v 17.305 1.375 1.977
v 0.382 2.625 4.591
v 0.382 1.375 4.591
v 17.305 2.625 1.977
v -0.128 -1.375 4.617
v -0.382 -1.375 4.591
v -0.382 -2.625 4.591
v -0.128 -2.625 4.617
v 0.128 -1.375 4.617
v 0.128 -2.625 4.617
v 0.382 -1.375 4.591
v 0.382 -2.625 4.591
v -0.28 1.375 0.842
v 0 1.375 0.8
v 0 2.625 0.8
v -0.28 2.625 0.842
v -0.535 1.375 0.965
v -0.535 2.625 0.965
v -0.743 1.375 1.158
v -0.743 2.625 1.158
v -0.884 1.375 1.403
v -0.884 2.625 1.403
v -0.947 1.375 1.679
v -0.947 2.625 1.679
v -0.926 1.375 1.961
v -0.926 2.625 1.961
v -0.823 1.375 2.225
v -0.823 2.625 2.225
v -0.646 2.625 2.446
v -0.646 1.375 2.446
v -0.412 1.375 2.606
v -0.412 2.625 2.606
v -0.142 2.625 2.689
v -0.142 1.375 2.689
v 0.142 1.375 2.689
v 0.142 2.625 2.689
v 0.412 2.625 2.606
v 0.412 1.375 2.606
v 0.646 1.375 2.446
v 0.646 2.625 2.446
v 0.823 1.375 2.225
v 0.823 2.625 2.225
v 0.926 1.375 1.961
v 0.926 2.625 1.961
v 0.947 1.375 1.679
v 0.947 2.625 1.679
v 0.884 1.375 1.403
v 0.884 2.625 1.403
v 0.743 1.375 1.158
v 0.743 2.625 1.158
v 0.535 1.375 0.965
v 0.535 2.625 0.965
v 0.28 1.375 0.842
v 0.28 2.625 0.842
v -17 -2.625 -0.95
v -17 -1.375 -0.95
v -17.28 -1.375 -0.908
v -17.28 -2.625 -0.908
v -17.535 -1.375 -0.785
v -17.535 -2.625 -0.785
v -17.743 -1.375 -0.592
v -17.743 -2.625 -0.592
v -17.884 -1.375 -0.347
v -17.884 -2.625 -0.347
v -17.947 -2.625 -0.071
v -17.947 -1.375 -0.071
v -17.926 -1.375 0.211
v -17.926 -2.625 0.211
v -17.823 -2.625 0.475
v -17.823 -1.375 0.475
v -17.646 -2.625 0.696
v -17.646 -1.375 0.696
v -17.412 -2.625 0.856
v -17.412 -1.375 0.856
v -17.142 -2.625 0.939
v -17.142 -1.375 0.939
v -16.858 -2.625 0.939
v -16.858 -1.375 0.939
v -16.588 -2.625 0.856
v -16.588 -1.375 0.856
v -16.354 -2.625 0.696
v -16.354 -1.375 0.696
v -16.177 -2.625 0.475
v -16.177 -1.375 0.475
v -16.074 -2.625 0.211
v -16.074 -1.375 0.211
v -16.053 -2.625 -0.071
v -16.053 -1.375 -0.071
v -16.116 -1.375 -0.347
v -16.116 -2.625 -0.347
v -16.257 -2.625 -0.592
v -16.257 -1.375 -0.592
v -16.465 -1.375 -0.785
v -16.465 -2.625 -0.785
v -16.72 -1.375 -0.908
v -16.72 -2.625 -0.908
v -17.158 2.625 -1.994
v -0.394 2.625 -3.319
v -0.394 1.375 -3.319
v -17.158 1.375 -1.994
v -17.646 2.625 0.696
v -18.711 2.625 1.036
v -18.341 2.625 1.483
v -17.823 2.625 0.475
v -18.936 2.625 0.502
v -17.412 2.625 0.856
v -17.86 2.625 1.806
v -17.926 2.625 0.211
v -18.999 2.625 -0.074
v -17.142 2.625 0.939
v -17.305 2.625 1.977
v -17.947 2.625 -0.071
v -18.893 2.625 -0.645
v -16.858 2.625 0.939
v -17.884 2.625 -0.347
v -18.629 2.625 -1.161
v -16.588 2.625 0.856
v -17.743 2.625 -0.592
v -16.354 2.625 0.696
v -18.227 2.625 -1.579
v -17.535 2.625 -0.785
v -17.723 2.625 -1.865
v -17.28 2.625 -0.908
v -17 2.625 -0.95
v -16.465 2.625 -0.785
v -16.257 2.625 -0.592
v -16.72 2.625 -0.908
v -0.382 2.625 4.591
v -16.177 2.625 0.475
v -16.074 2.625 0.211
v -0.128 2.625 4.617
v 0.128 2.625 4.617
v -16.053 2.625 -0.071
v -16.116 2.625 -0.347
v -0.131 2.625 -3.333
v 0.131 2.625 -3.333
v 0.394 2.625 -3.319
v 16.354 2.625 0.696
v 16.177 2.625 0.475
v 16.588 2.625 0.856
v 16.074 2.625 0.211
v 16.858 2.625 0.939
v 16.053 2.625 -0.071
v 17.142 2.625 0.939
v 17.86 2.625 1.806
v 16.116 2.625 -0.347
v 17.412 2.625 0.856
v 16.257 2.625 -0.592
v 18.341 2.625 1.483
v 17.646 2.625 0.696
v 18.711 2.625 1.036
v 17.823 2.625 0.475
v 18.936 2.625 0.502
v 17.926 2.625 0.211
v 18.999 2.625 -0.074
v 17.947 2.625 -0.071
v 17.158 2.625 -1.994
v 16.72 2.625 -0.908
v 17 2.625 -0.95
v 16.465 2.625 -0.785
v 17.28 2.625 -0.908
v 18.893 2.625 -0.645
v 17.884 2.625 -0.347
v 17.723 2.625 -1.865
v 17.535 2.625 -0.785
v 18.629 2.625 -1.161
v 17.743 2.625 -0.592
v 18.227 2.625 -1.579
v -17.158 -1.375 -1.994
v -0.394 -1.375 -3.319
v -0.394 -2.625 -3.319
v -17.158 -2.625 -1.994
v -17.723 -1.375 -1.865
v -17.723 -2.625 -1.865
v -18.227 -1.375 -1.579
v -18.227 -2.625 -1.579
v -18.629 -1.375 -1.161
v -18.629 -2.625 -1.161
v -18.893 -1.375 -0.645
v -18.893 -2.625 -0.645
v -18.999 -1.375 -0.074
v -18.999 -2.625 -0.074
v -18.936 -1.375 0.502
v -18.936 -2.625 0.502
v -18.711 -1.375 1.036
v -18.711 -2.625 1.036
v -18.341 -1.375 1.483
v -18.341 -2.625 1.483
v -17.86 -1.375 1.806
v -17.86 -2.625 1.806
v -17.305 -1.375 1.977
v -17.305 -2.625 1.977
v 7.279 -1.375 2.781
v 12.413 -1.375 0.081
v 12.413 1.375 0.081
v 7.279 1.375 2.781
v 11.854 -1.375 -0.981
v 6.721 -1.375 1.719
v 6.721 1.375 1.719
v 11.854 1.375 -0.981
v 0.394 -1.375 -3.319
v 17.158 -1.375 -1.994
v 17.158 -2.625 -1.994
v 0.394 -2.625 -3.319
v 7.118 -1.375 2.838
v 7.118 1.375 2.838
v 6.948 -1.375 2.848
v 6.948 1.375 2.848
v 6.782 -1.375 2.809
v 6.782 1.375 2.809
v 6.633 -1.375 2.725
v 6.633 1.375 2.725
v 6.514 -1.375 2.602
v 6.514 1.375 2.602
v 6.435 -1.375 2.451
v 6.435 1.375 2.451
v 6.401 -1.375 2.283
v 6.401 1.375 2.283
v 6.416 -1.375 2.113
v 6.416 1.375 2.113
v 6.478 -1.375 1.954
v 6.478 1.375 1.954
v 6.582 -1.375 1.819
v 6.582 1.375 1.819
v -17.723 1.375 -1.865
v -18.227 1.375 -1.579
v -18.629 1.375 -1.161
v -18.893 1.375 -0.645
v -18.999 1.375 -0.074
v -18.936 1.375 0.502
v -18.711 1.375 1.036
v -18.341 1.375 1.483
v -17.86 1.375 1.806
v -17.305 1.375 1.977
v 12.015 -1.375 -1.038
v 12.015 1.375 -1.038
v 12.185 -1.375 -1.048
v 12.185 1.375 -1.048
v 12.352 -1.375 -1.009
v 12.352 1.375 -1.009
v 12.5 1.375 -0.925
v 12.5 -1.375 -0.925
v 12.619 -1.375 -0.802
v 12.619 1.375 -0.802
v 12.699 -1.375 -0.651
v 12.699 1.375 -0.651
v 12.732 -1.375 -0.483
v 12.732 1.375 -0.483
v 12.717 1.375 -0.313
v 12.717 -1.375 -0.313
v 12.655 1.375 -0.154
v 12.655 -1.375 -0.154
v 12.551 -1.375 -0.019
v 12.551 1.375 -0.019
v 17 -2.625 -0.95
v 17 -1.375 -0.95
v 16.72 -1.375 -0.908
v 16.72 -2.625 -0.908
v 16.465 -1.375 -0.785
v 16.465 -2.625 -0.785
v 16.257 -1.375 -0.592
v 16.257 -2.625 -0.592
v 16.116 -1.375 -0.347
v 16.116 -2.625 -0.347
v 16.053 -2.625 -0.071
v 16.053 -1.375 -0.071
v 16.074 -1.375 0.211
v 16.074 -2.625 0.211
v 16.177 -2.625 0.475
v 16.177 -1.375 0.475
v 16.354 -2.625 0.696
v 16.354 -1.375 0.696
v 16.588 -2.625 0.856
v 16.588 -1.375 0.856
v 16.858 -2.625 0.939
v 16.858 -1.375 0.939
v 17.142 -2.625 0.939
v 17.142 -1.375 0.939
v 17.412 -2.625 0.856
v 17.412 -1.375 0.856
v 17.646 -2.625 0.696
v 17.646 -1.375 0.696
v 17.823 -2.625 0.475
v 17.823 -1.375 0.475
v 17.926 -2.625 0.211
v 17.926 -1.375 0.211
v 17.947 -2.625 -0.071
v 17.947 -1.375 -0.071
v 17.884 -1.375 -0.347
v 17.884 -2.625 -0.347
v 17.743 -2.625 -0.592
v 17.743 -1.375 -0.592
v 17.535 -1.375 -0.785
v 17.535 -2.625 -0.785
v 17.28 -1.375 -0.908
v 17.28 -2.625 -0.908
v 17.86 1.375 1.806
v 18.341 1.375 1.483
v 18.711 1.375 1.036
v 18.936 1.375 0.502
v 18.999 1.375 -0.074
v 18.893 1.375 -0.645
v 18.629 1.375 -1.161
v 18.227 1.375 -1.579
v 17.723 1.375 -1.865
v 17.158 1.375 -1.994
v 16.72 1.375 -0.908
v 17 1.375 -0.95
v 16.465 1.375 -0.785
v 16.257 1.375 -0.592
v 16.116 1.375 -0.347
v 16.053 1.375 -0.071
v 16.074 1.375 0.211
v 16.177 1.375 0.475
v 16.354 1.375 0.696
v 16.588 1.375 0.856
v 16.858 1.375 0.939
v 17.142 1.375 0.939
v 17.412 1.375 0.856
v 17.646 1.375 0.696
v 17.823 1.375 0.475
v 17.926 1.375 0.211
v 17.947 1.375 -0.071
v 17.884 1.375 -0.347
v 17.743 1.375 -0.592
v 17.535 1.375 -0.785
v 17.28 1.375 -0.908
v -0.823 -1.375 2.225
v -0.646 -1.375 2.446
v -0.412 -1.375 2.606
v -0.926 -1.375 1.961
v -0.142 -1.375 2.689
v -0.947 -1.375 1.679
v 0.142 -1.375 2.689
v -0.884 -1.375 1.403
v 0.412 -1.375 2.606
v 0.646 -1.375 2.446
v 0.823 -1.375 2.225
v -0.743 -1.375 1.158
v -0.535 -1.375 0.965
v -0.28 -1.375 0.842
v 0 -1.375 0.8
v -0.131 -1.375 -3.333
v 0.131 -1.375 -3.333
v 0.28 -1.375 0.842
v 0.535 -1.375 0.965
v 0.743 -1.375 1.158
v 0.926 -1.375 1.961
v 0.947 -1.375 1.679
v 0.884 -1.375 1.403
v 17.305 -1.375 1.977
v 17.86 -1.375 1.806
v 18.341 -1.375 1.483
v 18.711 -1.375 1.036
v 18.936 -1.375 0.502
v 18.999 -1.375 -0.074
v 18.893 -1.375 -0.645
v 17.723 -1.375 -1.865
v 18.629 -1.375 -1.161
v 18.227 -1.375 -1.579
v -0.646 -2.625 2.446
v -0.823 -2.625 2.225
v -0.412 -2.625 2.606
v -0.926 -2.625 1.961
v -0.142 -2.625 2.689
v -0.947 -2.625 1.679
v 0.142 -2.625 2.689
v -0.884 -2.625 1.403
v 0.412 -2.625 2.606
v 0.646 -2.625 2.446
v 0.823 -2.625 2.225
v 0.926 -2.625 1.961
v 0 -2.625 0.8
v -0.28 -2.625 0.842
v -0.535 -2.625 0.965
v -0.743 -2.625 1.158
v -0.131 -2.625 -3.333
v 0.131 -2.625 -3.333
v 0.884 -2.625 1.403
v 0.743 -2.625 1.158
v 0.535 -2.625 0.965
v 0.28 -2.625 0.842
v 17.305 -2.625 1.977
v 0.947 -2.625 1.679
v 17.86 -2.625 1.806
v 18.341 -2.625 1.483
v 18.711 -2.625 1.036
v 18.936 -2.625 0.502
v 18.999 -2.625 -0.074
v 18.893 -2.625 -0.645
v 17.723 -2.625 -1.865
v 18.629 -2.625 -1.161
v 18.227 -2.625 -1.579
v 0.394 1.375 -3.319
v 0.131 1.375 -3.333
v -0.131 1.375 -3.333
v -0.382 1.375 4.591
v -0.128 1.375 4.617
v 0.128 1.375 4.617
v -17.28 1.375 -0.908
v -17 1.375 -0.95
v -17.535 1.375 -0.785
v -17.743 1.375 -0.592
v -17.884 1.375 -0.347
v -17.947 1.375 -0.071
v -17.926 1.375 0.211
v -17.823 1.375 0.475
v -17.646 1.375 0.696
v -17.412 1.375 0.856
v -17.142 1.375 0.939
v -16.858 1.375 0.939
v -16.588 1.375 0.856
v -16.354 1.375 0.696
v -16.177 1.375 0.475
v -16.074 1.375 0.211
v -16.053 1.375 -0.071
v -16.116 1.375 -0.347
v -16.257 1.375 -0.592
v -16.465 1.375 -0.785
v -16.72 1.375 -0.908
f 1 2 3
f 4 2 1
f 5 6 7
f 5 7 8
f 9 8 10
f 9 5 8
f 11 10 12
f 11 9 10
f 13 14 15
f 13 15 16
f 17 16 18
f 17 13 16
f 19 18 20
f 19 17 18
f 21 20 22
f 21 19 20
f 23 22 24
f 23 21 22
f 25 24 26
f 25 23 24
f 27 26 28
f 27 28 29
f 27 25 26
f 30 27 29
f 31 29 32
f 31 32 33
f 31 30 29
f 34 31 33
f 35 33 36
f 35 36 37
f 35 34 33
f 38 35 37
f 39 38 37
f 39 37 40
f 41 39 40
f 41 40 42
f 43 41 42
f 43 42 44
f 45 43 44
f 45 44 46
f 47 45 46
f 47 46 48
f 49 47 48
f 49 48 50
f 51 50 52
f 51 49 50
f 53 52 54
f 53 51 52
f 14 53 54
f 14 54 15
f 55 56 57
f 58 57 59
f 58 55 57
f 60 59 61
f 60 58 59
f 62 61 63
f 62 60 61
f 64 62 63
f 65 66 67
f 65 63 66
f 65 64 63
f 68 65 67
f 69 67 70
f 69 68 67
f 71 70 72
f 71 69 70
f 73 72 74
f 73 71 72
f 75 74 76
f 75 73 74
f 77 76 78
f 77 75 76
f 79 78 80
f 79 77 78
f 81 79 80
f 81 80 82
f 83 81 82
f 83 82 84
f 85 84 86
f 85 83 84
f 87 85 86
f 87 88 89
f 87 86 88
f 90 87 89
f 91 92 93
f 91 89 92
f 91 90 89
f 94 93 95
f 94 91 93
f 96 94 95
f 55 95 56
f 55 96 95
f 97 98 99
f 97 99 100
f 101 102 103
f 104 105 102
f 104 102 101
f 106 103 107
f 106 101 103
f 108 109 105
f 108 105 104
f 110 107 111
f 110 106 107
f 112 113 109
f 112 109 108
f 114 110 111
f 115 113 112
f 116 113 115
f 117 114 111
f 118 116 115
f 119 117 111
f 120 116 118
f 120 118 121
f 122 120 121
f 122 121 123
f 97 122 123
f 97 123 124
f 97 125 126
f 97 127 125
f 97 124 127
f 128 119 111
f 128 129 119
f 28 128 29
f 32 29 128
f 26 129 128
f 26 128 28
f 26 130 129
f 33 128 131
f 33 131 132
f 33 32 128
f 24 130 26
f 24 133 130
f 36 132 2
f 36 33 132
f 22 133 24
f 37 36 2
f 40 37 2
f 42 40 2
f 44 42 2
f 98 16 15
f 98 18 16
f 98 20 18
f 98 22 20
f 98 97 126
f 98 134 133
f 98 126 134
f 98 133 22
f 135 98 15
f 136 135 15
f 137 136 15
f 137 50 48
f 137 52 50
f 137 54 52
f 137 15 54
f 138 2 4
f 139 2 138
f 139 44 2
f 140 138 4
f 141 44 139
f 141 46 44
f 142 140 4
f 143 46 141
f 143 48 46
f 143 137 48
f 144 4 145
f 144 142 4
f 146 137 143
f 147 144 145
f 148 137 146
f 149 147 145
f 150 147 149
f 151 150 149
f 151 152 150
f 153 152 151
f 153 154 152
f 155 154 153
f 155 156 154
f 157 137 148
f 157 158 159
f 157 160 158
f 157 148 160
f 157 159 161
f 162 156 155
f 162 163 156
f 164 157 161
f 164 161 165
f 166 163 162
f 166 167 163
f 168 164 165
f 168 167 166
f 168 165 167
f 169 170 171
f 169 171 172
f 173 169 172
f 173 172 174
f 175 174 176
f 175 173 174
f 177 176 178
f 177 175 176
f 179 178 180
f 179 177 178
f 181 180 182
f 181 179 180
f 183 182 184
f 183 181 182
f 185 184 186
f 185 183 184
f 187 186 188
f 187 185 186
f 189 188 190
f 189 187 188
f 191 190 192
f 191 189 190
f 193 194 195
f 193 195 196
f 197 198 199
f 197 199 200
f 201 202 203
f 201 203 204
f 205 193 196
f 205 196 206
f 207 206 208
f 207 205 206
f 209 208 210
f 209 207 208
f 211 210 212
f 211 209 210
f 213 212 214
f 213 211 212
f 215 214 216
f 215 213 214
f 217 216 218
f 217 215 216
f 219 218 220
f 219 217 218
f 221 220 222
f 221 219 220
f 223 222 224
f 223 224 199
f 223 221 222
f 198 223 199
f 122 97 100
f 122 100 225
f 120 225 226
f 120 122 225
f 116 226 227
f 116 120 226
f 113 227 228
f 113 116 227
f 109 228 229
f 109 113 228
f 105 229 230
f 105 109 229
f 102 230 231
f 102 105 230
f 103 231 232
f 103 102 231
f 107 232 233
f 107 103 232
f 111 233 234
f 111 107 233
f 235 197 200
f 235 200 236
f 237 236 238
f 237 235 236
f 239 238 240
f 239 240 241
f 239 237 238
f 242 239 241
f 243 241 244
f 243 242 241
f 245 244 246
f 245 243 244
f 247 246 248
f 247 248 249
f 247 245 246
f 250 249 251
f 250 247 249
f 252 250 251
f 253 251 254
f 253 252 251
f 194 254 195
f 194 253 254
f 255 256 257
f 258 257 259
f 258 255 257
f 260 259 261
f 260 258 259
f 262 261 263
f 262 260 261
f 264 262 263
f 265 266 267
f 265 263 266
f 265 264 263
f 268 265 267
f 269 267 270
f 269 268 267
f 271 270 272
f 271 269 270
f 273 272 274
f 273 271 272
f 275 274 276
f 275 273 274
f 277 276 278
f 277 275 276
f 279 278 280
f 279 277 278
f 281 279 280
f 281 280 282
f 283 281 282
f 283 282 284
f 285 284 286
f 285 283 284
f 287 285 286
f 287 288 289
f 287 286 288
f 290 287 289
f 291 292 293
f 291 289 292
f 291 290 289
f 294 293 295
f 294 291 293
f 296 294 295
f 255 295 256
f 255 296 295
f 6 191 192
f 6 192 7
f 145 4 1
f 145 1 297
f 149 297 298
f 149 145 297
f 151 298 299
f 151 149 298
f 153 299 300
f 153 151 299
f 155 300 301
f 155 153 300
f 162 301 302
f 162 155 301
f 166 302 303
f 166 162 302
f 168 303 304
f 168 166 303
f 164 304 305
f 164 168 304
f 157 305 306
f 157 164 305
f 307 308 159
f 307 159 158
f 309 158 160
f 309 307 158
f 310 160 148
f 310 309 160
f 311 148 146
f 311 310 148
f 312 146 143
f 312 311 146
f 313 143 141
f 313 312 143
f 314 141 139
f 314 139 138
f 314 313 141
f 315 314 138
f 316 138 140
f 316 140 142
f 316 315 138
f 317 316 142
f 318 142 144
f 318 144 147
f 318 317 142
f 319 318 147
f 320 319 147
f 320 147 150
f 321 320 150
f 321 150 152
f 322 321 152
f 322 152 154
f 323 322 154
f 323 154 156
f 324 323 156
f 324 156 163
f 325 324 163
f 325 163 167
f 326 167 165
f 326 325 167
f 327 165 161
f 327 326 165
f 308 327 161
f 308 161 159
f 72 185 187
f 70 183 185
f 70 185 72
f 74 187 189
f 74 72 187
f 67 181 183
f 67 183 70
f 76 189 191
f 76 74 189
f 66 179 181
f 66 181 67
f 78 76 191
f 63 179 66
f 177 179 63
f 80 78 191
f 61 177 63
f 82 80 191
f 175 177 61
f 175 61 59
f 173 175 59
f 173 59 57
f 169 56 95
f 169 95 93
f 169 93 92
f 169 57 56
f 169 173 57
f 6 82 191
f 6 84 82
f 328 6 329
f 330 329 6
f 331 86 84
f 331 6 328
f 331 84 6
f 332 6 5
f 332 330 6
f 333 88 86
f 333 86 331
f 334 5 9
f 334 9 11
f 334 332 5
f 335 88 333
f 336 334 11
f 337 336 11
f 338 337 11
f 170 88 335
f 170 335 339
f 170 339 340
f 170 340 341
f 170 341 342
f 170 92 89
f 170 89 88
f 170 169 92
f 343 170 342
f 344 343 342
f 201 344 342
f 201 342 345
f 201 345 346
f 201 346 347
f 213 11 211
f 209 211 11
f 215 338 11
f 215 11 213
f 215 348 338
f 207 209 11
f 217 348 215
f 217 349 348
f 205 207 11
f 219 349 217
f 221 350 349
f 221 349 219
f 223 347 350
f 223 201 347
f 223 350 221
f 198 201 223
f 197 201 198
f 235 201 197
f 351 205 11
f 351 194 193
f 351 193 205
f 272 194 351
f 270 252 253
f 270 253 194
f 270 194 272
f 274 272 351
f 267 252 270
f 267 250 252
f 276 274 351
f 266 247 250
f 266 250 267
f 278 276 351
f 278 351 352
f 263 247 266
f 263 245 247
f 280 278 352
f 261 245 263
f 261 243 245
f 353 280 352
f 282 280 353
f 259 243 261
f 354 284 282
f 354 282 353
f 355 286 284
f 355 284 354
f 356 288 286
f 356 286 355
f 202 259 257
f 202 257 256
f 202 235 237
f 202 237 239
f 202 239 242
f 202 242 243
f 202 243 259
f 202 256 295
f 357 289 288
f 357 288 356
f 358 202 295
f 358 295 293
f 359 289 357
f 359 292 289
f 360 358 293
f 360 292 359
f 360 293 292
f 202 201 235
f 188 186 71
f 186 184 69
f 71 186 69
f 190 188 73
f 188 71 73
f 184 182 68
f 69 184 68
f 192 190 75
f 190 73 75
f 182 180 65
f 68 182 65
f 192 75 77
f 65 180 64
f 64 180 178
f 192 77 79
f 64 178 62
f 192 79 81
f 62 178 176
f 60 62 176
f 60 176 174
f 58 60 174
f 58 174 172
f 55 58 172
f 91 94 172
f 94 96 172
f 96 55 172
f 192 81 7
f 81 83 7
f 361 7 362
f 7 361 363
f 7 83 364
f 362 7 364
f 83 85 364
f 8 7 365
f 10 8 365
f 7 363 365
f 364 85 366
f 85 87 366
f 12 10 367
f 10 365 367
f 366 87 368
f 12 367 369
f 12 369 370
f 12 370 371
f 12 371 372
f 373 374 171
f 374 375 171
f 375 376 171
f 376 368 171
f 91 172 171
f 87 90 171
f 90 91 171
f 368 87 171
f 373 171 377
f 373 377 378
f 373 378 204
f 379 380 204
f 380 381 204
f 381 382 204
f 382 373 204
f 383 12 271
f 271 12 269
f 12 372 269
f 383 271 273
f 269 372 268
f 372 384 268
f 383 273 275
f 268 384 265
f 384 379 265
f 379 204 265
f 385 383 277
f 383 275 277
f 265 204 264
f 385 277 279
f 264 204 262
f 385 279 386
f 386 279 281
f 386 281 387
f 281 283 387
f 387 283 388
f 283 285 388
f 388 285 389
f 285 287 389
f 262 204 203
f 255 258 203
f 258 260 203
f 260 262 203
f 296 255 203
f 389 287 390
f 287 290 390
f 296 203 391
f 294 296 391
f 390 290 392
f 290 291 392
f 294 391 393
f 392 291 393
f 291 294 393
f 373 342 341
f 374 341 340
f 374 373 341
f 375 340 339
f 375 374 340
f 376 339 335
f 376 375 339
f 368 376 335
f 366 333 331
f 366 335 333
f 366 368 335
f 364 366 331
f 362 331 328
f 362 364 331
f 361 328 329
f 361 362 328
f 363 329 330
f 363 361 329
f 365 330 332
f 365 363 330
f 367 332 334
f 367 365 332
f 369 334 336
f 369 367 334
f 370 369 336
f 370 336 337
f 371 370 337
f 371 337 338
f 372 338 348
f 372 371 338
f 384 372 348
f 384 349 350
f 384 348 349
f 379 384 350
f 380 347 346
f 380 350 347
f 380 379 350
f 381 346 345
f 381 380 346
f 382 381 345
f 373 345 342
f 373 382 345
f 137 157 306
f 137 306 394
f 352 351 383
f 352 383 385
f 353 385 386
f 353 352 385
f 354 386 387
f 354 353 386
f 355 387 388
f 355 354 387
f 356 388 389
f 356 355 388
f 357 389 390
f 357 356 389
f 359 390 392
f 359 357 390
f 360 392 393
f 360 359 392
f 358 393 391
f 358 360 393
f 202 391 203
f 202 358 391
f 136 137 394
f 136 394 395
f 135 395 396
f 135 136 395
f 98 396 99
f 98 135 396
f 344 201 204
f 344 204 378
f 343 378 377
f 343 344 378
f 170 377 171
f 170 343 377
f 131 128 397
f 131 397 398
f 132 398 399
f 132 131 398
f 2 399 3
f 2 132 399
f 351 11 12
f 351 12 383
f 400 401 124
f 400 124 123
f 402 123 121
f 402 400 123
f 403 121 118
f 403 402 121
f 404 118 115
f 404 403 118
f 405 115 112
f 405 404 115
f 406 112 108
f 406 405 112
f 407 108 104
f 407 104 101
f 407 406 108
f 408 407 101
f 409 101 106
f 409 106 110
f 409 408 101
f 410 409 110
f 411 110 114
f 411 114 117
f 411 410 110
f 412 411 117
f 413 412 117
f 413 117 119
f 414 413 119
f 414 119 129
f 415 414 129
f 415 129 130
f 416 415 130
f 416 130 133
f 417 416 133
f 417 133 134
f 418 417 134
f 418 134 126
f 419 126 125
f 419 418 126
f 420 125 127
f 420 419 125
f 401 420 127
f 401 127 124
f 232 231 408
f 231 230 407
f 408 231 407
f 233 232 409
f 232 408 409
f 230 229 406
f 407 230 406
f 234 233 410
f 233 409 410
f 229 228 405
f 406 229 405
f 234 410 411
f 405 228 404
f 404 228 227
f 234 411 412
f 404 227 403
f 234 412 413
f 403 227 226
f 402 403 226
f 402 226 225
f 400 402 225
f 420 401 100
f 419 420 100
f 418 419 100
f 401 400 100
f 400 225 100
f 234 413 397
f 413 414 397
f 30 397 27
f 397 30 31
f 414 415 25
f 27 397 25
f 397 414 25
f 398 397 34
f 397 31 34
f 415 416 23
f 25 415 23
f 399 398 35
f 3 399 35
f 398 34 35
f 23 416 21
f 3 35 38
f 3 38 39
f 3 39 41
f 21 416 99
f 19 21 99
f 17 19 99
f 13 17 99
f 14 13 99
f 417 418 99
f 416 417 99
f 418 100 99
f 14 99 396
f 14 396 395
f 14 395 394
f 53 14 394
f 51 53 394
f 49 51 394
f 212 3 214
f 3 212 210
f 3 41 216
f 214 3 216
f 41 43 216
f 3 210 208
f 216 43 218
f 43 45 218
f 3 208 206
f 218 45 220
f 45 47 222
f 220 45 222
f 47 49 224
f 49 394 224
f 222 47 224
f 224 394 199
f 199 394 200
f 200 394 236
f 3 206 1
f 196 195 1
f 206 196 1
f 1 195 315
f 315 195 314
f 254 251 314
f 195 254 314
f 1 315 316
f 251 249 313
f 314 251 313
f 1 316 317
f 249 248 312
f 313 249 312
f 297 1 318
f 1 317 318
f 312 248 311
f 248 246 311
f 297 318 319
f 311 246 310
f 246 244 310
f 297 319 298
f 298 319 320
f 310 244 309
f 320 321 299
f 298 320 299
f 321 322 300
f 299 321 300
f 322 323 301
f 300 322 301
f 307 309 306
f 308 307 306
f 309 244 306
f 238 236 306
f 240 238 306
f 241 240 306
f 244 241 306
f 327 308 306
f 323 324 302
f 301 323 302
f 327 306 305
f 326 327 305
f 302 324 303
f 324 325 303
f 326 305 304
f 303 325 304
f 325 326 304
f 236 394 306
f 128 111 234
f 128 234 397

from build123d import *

# Parameters (mm, degrees)
SKETCH1_R                = 0.95
BOSS_EXTRUDE1_DEPTH      = 2.625
CUT_EXTRUDE1_DEPTH       = 20.729120518
CUT_EXTRUDE1_DEPTH_BACK  = 5.25
SKETCH2_W                = 38
SKETCH2_H                = 2.75
BOSS_EXTRUDE2_DEPTH      = 2.625
BOSS_EXTRUDE2_DEPTH_BACK = 1.375


with BuildPart() as part:
    # Sketch1 → Boss-Extrude1 (new, symmetric)
    with BuildSketch(Plane(origin=(0, 0, 0), x_dir=(1, 0, 0), z_dir=(0, 1, 0))):
        with BuildLine():
            Line((-0.393995074, 3.318856737), (-17.15759803, 1.993781046))
            ThreePointArc((-17.15759803, 1.993781046), (-18.998616533, 0.074377097), (-17.305351185, -1.97655272))
            Line((-17.305351185, -1.97655272), (-0.381688981, -4.591034114))
            ThreePointArc((-0.381688981, -4.591034114), (0, -4.620343214), (0.381688981, -4.591034114))
            Line((0.381688981, -4.591034114), (17.305351185, -1.97655272))
            ThreePointArc((17.305351185, -1.97655272), (18.998616533, 0.074377097), (17.15759803, 1.993781046))
            Line((17.15759803, 1.993781046), (0.393995074, 3.318856737))
            ThreePointArc((0.393995074, 3.318856737), (0, 3.334404121), (-0.393995074, 3.318856737))
        make_face()
        with Locations(Location((-17, 0, 0), (0, 0, 90))):
            Circle(SKETCH1_R, mode=Mode.SUBTRACT)
        with Locations(Location((17, 0, 0), (0, 0, 90))):
            Circle(SKETCH1_R, mode=Mode.SUBTRACT)
        with Locations(Location((0, -1.75, 0), (0, 0, 90))):
            Circle(SKETCH1_R, mode=Mode.SUBTRACT)
    extrude(amount=BOSS_EXTRUDE1_DEPTH, both=True)

    # Sketch2 → Cut-Extrude1 (cut, two sides: drawn at the far end of the back side and taken through both)
    with BuildSketch(Plane.XY.offset(-CUT_EXTRUDE1_DEPTH_BACK)):
        Rectangle(SKETCH2_W, SKETCH2_H)
    extrude(amount=CUT_EXTRUDE1_DEPTH + CUT_EXTRUDE1_DEPTH_BACK, mode=Mode.SUBTRACT)


with BuildPart() as cut_extrude1_piece_1:
    # of the separate pieces the step leaves, piece 1, a body of its own (cut_extrude1_pieces)
    add(part.part.solids().sort_by_distance((17.15759803, 2.625, -1.993781046))[0])



with BuildPart() as cut_extrude1_piece_2:
    # of the separate pieces the step leaves, piece 2, a body of its own (cut_extrude1_pieces)
    add(part.part.solids().sort_by_distance((17.15759803, -1.375, -1.993781046))[0])


with BuildPart() as cut_extrude1_piece_1_1:
    add(cut_extrude1_piece_1.part)

    add(cut_extrude1_piece_2.part)  # Boss-Extrude2 merges Cut-Extrude1 piece 2
    # Sketch3 → Boss-Extrude2 (add, two sides: drawn at the far end of the back side and taken through both)
    with BuildSketch(Plane(origin=(0, 0, 0), x_dir=(1, 0, 0), z_dir=(0, 1, 0)).offset(-BOSS_EXTRUDE2_DEPTH_BACK)):
        with BuildLine():
            Line((12.412535452, -0.081023287), (7.279310345, -2.781023287))
            ThreePointArc((7.279310345, -2.781023287), (6.468976713, -2.529310345), (6.720689655, -1.718976713))
            Line((6.720689655, -1.718976713), (11.853914762, 0.981023287))
            ThreePointArc((11.853914762, 0.981023287), (12.664248394, 0.729310345), (12.412535452, -0.081023287))
        make_face()
    extrude(amount=BOSS_EXTRUDE2_DEPTH + BOSS_EXTRUDE2_DEPTH_BACK)


solid = cut_extrude1_piece_1_1.part
